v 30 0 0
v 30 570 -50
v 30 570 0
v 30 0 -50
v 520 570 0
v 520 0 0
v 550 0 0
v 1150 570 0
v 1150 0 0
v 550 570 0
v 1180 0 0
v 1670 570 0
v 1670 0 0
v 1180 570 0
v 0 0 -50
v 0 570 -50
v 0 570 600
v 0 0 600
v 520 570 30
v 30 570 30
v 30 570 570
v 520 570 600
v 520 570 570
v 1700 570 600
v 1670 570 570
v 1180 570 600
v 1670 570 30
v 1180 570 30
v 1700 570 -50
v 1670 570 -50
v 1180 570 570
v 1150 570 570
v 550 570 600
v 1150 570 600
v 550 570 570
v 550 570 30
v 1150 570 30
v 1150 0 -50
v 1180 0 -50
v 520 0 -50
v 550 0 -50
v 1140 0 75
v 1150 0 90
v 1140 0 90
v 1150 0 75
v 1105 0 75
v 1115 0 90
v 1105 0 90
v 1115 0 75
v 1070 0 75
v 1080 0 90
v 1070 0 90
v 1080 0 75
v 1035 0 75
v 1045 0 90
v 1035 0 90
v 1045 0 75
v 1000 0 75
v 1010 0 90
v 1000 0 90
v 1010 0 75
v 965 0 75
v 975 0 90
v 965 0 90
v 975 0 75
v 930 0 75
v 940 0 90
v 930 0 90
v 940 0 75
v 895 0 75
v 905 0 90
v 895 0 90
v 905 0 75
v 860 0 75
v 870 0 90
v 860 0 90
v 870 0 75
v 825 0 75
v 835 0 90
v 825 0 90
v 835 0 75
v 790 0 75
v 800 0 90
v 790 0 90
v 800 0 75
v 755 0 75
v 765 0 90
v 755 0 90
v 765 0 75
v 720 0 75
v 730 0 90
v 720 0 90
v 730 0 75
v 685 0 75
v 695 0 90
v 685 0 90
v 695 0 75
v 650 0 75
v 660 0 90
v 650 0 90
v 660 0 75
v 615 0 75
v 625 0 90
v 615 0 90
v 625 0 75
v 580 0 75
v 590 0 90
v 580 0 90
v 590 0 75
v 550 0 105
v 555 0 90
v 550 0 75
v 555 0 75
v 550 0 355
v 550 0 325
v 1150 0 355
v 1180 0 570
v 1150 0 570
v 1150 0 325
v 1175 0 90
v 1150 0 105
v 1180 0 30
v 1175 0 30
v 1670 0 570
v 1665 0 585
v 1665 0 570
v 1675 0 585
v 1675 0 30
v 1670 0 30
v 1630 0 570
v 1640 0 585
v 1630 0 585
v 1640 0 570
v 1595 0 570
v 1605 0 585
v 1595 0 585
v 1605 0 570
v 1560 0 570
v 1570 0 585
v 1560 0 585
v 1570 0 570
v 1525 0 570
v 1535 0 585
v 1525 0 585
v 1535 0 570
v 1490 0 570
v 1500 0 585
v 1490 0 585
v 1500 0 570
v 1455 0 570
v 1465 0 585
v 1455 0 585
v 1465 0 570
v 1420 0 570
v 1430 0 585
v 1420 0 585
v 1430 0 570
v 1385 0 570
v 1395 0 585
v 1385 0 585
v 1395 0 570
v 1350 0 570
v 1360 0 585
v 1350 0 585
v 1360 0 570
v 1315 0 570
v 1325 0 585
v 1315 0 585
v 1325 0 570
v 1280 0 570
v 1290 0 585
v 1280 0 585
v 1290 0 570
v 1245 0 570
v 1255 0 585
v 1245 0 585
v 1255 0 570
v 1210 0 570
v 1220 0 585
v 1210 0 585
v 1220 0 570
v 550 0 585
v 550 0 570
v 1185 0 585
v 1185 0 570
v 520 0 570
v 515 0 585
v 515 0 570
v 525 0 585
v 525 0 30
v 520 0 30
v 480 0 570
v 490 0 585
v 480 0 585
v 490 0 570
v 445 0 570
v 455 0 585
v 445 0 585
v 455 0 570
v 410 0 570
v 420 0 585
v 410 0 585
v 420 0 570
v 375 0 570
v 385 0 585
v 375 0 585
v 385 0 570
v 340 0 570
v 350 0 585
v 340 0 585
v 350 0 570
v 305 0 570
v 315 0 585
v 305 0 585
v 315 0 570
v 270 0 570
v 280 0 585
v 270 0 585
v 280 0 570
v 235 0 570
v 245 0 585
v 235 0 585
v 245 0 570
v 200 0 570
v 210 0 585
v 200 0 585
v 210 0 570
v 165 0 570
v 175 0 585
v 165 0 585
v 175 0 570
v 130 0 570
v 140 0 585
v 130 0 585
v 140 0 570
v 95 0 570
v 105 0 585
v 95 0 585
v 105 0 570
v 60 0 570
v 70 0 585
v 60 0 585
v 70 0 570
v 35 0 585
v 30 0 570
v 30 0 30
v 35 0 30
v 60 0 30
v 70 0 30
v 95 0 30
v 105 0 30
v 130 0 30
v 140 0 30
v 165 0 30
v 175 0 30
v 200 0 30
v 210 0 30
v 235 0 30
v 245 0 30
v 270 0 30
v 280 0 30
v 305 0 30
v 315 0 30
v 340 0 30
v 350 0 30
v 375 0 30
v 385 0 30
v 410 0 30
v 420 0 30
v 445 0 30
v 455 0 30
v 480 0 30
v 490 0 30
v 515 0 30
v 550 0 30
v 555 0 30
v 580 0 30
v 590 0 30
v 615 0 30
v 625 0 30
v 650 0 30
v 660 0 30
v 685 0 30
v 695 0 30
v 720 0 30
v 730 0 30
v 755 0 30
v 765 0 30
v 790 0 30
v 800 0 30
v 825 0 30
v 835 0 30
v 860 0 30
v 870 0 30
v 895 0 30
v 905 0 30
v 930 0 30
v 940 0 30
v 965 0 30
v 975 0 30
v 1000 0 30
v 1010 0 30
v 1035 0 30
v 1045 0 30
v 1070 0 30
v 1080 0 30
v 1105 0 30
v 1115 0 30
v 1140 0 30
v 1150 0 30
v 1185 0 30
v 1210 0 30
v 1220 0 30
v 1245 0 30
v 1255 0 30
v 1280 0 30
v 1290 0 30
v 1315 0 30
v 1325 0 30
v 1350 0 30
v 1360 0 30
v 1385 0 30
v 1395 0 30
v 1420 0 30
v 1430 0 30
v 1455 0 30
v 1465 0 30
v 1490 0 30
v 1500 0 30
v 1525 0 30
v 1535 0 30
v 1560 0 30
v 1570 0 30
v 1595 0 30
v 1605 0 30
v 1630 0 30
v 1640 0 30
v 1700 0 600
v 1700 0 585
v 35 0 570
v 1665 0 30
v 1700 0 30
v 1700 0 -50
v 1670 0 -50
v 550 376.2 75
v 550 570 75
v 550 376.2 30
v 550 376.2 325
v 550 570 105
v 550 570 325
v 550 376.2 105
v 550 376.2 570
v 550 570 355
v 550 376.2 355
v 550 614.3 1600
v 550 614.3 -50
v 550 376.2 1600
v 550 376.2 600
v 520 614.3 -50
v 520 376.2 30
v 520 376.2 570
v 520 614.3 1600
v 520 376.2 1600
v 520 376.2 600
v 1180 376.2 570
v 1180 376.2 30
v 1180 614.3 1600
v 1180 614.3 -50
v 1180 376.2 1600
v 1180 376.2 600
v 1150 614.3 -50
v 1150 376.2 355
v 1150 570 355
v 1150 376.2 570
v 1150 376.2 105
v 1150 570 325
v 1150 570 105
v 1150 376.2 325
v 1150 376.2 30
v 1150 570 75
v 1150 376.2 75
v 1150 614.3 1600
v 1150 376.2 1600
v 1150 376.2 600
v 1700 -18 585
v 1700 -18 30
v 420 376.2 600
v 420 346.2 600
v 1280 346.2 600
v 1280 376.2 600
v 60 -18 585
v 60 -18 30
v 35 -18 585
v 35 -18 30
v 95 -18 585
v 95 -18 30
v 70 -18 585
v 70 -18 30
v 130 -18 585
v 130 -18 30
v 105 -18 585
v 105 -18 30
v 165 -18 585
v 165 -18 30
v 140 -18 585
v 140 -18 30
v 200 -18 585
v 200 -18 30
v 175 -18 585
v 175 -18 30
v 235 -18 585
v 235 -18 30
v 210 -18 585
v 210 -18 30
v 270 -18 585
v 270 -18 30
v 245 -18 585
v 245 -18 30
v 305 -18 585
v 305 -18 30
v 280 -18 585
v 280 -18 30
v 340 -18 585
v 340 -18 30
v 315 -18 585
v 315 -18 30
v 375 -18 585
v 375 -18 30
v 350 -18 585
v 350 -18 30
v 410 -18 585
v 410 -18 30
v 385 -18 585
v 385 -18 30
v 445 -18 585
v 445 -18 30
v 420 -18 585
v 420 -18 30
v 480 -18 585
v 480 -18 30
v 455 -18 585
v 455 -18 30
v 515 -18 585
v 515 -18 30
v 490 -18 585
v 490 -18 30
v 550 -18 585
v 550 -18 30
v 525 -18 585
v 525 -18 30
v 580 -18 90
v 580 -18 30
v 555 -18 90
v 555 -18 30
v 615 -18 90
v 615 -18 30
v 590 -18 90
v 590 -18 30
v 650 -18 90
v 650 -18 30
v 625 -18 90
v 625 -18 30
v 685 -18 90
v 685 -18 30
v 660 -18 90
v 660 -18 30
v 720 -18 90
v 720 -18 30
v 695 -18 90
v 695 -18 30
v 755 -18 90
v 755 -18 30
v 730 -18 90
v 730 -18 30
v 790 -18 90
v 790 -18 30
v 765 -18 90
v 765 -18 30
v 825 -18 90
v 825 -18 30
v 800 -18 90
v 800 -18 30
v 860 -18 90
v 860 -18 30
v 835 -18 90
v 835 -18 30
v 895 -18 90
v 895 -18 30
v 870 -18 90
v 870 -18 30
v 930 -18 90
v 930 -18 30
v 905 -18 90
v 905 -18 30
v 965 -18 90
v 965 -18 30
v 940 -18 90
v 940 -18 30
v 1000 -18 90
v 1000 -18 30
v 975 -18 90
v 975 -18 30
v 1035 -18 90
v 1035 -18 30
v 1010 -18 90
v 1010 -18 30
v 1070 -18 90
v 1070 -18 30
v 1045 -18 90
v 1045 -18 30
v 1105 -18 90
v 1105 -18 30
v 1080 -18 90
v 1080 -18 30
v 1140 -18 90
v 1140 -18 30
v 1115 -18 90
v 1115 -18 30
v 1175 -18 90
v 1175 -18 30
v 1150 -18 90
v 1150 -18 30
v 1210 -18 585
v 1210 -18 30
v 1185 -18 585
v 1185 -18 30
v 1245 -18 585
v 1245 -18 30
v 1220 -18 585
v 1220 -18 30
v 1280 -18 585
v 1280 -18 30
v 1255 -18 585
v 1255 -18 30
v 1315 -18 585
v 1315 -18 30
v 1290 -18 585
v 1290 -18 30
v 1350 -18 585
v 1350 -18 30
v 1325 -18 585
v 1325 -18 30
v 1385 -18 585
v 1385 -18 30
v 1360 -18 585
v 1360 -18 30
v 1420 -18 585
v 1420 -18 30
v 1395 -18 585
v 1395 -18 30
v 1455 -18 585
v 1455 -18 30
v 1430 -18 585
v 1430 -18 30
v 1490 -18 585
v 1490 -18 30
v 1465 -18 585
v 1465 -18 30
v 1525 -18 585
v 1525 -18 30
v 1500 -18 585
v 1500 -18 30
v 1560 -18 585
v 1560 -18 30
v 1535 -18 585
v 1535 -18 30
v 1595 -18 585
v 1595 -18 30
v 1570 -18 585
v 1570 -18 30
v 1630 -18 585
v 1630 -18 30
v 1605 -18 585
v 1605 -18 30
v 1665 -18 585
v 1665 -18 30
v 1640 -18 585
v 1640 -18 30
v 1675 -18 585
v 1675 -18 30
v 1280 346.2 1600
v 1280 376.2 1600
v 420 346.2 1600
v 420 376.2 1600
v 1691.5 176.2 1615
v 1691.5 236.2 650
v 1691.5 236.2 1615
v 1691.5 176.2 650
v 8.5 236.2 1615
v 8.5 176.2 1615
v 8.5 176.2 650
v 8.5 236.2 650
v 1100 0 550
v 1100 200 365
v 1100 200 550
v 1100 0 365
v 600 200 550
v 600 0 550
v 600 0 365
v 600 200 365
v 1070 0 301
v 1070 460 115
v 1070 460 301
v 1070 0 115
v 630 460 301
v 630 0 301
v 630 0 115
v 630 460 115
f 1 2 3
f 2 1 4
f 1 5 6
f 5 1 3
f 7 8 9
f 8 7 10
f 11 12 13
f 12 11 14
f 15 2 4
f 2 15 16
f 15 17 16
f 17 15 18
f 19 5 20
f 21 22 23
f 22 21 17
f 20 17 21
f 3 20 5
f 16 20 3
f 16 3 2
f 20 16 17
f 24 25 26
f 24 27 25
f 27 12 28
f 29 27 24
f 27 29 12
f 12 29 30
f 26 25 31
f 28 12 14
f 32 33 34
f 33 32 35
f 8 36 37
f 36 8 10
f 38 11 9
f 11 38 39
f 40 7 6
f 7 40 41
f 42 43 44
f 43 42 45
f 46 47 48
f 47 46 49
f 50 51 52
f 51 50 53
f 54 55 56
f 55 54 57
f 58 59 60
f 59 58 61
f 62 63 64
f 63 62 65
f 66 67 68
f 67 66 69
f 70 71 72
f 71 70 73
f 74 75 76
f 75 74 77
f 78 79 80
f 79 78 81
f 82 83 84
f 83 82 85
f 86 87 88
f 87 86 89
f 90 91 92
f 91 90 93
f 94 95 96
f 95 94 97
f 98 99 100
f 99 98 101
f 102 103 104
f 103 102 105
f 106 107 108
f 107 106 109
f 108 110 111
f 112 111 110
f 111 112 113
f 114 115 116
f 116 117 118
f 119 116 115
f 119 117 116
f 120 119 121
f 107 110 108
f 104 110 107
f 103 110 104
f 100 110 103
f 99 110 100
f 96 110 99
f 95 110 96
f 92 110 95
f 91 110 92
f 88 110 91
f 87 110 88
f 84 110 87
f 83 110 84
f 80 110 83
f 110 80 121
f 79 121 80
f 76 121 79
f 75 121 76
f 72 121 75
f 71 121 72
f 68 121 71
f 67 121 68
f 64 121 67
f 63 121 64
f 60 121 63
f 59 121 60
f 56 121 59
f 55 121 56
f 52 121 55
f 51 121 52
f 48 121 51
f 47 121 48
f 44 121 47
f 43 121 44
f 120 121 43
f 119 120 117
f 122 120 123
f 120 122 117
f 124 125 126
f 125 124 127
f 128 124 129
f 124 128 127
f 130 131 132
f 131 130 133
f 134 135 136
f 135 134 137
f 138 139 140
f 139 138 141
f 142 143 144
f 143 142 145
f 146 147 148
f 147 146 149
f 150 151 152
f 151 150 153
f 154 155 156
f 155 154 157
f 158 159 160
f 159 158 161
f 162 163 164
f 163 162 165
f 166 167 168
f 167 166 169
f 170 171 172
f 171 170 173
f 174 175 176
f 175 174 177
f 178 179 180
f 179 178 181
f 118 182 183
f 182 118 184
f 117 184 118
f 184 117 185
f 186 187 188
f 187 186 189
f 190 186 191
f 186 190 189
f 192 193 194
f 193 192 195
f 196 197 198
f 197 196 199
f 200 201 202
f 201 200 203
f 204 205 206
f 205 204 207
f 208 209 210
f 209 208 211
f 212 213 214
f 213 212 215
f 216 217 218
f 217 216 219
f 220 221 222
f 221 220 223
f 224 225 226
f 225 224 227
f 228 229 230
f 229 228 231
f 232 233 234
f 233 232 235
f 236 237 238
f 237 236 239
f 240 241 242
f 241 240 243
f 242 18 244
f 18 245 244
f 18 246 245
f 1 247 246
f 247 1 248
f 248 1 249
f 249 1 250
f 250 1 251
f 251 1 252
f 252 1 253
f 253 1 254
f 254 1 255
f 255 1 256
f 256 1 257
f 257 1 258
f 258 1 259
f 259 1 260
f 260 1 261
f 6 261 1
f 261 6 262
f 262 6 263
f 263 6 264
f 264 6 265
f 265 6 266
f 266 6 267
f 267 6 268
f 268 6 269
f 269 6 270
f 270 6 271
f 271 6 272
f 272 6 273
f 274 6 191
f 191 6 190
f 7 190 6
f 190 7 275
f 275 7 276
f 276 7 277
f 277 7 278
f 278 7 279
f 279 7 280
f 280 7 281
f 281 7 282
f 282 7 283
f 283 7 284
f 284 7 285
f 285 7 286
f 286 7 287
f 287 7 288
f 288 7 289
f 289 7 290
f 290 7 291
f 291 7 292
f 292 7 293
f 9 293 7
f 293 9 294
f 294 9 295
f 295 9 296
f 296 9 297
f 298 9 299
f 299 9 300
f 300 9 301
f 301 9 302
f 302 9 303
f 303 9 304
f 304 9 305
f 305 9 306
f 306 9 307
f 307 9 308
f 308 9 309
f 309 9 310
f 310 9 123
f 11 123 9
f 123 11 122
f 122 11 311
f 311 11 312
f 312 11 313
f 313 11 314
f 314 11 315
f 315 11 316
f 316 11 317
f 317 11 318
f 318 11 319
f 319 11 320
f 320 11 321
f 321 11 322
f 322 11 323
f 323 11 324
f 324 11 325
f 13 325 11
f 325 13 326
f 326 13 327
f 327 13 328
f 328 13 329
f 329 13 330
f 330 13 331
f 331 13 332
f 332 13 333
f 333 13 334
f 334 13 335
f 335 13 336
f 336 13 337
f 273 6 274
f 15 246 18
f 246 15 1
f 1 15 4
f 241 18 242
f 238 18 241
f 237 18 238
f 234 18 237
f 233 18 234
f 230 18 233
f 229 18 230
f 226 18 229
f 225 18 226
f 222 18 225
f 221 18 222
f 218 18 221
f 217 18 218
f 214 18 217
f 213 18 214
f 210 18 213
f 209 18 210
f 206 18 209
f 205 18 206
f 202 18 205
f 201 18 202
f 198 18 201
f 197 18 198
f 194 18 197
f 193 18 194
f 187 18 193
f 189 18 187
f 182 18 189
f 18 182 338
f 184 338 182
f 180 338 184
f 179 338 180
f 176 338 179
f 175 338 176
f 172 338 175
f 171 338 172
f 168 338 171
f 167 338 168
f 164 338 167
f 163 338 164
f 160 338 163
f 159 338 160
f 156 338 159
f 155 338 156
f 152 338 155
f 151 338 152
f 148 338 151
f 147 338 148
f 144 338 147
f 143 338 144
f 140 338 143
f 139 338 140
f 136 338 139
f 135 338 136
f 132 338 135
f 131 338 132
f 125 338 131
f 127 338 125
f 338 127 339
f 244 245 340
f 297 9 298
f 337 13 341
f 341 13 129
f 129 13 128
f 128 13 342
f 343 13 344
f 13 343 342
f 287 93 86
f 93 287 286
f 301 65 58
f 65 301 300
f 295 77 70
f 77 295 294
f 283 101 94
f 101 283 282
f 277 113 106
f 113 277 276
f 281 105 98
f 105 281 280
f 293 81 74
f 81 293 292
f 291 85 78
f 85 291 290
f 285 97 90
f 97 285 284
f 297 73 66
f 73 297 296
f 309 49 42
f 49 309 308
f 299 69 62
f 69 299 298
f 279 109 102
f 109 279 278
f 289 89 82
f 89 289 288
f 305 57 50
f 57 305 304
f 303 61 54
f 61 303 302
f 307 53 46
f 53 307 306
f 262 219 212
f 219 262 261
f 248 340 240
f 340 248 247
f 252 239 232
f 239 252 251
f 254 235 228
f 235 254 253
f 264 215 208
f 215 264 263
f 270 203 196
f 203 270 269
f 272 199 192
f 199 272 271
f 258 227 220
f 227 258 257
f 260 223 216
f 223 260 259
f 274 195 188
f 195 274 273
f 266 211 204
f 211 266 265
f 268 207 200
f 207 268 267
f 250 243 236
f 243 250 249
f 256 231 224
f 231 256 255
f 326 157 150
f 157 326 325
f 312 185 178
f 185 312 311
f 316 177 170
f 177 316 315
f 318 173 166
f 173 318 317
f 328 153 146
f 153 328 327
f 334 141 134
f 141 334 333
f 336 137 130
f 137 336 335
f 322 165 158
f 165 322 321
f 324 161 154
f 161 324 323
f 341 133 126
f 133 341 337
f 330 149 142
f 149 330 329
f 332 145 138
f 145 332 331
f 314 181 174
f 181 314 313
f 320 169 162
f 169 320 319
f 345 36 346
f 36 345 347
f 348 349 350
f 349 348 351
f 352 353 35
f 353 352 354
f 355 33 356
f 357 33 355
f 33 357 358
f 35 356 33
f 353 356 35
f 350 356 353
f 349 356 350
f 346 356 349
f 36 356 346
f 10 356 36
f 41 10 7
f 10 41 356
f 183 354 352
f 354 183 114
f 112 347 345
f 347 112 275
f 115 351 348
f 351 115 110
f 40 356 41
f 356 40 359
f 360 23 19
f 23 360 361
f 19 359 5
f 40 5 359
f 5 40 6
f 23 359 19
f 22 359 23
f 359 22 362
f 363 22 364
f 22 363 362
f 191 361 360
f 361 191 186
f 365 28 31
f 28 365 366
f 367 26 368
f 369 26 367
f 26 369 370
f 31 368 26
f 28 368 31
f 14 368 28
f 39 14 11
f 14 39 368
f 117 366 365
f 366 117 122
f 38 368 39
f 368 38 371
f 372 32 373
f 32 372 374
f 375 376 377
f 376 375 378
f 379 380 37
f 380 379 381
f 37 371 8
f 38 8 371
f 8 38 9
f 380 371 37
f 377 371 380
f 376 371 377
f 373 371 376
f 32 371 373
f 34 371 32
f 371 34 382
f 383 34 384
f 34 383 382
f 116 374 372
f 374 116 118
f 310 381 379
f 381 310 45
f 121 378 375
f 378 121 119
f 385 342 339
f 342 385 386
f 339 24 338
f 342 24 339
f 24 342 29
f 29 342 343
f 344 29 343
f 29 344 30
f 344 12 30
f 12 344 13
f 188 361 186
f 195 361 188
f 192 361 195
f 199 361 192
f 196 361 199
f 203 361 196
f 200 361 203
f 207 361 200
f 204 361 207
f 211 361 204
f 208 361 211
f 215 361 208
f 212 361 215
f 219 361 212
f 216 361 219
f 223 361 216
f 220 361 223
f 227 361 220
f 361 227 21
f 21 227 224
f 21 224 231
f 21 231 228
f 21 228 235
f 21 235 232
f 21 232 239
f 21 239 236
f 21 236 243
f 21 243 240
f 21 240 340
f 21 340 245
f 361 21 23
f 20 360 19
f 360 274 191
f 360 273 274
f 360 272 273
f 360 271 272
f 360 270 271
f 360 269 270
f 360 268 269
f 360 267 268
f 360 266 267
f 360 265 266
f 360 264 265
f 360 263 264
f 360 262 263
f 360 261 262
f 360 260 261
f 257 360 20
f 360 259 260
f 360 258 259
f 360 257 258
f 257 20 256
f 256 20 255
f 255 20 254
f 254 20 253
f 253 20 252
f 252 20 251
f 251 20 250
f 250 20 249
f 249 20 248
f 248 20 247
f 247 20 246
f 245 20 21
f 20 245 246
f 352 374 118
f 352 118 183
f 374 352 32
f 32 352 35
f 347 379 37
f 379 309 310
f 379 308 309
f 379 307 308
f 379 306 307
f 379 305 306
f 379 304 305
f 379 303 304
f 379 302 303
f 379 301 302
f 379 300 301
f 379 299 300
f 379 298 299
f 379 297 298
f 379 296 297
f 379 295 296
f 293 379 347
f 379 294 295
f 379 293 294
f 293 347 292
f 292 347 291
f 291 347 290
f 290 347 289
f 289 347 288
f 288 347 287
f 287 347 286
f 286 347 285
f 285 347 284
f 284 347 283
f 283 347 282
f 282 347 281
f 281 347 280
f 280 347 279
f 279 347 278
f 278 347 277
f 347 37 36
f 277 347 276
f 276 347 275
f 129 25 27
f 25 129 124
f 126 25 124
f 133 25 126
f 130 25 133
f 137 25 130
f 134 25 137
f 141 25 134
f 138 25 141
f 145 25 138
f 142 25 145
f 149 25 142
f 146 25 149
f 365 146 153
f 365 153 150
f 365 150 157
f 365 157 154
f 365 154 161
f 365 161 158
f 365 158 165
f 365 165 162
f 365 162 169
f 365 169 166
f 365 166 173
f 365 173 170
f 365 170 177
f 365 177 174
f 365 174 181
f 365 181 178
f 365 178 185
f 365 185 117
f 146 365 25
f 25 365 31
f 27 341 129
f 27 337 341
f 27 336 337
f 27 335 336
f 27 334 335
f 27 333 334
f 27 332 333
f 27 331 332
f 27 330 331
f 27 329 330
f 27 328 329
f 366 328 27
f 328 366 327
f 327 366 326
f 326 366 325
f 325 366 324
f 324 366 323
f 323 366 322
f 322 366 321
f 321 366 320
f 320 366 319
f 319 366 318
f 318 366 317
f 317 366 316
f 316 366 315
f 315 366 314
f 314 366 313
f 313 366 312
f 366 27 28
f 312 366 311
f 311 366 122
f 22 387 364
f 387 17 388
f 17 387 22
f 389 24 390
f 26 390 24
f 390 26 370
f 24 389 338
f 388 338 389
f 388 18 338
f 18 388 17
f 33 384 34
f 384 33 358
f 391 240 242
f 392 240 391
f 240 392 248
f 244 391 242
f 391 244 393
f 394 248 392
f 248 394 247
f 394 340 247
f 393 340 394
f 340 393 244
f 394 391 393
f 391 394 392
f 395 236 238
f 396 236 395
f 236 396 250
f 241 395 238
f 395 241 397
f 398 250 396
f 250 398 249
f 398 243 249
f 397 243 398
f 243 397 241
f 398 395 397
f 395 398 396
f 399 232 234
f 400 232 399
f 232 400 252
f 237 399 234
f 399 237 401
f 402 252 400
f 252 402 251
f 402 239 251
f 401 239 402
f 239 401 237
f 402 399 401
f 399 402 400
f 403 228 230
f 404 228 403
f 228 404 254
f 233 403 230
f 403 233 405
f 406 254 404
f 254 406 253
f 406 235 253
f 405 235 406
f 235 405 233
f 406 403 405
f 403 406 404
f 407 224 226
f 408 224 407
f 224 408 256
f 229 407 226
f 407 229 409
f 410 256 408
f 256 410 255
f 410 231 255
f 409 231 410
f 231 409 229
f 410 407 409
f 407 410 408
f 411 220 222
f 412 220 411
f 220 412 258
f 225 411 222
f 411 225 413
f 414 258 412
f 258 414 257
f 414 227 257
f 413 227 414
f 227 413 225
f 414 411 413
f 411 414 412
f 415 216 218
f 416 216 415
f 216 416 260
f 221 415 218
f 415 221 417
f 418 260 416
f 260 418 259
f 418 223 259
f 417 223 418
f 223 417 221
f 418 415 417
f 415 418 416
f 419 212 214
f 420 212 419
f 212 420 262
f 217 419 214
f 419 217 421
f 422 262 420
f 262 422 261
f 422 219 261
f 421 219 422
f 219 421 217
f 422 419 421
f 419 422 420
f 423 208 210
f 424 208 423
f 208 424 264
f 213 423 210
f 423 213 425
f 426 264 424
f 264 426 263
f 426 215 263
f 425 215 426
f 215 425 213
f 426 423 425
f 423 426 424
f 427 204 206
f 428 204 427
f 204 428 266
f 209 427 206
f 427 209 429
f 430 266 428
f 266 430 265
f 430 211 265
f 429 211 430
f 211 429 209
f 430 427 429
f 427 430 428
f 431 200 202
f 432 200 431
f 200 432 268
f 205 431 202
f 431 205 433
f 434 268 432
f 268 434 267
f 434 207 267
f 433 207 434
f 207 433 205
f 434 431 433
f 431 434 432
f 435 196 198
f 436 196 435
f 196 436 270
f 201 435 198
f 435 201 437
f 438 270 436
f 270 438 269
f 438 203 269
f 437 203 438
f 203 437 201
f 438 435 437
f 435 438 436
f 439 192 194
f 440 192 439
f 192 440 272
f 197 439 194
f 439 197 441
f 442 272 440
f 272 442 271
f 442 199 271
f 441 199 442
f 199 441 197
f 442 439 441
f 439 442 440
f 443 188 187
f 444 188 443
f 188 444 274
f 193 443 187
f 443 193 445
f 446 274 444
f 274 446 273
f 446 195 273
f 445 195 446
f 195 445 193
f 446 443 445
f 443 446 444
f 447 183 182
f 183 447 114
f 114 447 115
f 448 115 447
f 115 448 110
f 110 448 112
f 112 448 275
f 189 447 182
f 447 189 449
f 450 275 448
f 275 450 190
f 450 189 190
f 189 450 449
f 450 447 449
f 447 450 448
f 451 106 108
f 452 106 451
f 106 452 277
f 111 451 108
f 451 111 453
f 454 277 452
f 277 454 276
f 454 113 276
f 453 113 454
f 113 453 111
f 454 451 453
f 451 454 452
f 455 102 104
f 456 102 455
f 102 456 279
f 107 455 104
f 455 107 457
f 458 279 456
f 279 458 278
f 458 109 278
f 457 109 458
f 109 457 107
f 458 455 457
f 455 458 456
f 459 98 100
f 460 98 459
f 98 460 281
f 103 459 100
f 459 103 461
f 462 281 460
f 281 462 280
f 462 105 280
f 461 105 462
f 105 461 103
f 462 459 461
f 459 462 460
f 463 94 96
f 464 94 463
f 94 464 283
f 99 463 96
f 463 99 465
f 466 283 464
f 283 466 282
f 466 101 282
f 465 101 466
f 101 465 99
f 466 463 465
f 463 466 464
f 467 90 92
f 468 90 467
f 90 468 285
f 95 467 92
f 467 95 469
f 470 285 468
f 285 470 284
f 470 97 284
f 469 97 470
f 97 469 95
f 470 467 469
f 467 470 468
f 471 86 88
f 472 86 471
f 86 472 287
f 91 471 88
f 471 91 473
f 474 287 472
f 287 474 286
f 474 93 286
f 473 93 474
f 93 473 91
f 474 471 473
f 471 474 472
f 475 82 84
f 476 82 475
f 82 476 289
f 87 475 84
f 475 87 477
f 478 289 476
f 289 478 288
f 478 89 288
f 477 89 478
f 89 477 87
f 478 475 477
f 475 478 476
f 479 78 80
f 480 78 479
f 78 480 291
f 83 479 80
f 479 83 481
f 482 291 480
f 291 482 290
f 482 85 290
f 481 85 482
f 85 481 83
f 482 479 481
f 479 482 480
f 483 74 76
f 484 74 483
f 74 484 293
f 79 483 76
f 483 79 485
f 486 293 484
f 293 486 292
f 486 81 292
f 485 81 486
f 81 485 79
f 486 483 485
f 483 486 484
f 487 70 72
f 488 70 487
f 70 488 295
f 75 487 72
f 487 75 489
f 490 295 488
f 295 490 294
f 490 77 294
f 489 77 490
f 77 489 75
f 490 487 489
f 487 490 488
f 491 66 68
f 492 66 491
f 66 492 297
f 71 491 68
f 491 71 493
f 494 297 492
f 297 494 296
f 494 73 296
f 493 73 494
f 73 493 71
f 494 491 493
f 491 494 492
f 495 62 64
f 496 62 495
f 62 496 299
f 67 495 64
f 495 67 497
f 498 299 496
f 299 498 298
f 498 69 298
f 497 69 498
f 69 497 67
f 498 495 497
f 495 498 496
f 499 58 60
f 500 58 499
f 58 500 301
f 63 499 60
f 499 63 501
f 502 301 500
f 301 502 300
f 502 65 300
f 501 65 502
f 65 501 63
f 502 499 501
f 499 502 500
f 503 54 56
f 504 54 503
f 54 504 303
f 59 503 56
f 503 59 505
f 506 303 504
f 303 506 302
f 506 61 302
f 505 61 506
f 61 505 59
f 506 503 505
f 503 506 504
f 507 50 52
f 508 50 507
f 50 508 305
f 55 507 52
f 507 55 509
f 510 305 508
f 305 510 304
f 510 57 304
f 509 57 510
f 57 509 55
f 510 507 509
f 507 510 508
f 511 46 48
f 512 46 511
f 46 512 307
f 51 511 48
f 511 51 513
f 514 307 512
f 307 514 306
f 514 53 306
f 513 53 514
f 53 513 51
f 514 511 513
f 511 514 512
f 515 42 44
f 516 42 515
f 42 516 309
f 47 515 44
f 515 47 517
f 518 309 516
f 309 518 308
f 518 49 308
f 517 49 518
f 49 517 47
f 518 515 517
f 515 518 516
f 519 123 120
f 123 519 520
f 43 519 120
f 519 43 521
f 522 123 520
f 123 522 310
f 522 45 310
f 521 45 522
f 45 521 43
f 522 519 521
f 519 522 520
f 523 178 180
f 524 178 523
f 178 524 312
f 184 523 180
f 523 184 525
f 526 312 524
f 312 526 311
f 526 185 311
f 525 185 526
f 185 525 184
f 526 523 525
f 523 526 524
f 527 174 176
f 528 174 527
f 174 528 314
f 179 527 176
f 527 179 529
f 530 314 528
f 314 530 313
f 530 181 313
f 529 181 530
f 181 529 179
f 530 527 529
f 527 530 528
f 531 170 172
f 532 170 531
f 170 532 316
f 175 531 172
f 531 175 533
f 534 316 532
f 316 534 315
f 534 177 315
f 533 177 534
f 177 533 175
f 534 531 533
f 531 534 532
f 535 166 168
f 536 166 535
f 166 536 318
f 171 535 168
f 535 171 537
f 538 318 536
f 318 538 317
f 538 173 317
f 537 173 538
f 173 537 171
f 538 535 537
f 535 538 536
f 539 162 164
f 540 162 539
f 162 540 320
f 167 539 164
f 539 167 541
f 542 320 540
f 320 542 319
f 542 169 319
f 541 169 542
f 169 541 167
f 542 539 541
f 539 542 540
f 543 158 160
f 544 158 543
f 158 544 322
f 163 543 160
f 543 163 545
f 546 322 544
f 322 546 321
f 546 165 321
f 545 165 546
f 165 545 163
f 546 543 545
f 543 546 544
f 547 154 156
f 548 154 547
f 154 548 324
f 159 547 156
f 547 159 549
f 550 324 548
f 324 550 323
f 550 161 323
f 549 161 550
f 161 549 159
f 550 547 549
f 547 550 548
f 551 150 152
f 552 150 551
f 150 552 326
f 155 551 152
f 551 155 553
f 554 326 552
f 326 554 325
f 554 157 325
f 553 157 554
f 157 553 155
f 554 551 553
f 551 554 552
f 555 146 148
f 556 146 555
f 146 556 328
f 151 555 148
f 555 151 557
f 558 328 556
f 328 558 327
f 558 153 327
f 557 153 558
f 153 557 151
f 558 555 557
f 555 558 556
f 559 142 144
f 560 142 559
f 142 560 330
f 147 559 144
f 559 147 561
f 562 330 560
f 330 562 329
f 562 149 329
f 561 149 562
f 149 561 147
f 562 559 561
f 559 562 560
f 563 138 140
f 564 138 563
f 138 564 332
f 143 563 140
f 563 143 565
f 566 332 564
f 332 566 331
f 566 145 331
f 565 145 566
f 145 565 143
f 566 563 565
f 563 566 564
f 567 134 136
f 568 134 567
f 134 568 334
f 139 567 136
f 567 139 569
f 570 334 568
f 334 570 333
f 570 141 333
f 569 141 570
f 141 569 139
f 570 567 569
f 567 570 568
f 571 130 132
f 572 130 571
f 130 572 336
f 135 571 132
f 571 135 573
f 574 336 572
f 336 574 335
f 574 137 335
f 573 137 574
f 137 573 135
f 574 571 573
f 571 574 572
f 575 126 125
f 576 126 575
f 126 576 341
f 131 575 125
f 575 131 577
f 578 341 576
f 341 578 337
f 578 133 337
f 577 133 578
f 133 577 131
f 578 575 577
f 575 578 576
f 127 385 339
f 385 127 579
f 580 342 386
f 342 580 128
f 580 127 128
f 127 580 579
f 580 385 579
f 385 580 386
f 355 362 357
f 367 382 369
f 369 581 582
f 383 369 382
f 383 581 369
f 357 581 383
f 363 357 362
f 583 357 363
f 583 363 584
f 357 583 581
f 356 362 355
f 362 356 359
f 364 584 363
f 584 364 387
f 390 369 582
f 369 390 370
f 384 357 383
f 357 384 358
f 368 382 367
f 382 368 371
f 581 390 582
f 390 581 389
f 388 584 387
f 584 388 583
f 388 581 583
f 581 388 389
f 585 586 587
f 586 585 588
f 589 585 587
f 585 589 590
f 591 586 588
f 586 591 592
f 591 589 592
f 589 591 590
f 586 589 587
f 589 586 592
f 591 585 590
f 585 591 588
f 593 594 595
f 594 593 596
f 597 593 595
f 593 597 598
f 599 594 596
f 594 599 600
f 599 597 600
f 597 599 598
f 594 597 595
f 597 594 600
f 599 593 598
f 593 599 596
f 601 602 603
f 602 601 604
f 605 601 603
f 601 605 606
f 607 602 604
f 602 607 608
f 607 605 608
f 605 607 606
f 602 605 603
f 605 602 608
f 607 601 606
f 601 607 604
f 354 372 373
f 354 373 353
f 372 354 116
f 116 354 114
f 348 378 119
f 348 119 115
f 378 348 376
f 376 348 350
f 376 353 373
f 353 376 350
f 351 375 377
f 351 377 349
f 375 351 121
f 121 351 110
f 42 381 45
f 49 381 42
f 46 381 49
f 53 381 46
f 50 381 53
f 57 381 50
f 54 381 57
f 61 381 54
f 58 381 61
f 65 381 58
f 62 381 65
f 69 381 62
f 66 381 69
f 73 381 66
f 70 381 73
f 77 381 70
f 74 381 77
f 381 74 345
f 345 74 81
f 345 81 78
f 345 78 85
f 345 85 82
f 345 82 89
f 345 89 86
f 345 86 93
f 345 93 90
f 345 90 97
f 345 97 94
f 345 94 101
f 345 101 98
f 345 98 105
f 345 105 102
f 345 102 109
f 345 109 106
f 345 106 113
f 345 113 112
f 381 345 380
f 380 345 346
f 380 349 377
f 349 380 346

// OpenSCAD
top_u = 0;
bottom_u = 12;

middle_width = 600;
u_width = 490;
u = 45;

depth = 570;

top_cabinet_h = top_u * u;
bottom_cabinet_h = bottom_u * u;
single_wall = 15;

shelf_h = bottom_cabinet_h-2*single_wall-200;
shelf_h2 = 60;

leg_h = 50;



top_h = 2 * single_wall;
bottom_h = 2*single_wall;

panel_d = 18;
panel_h = 25;
panel_dist = 10;

// height without legs
main_h = bottom_h + bottom_cabinet_h + 0*single_wall + top_cabinet_h + top_h;
main_w = 6*single_wall + middle_width + 2*u_width + 2*single_wall;
total_h = main_h + leg_h;

tv_mount_offset = 110;
module rack(num, width=u_width){
    cube([width, depth, num*u]);
}

module leg() {
    cube([2*single_wall, depth, leg_h]);
}
module legs4() {
    translate([0, 0, -leg_h]) {
      translate([0,0,0]) leg();
      translate([2*single_wall+u_width,0,0]) leg();
      translate([4*single_wall+u_width+middle_width,0,0]) leg();
      translate([6*single_wall+2*u_width+middle_width,0,0]) leg();
     }
}
module main() {
    legs4();
    difference() {
    cube([main_w, depth, main_h]);
    translate([0, 0, bottom_h]) {
        translate([2*single_wall, 0, 0]) rack(bottom_u);
        translate([4*single_wall+u_width, 0, 0]) rack(bottom_u, middle_width);
        translate([6*single_wall+u_width+middle_width, 0, 0]) rack(bottom_u);
    }
    translate([0, 0, bottom_h+single_wall+bottom_cabinet_h]) {
        translate([2*single_wall, 0, 0]) rack(top_u);
        translate([4*single_wall+u_width, 0, 0]) rack(top_u, middle_width);
        translate([6*single_wall+u_width+middle_width, 0, 0]) rack(top_u);
    }
    }
}

module shelf(h) {
    translate([4*single_wall+u_width, 0, single_wall+h])
    cube([middle_width, depth, 2*single_wall]);
}

 
 module front_panel_v(h, w) {
    num = w / (panel_h+panel_dist);
    //echo("num", num);
    for (i = [0:1:num]) {
        //echo("i", i);
        translate([i*(panel_dist+panel_h), 0, 0]) 
          translate([0.5*panel_dist, 0, 0]) cube([panel_h, panel_d, h]);
    }
 }

 
 module panel_set3() {
     translate([2*single_wall, -panel_d, bottom_h]) 
       front_panel_v(bottom_cabinet_h + top_cabinet_h + single_wall, u_width);    
     translate([4*single_wall+u_width, -panel_d, bottom_h]) 
       front_panel_v(shelf_h2, middle_width);
     translate([6*single_wall+u_width+middle_width, -panel_d, bottom_h]) 
       front_panel_v(bottom_cabinet_h + top_cabinet_h + single_wall, u_width);
 }
 
 module tv_stand(h, w) {
     stand_depth = 50+0.33*depth;
     stand_h = total_h + h;
     tv_plate_h = 0.25 * h;
     translate([u_width+2*single_wall, 0.66*depth, -leg_h]) {
         cube([2*single_wall, stand_depth, stand_h]);
         translate([middle_width+2*single_wall, 0, 0]) 
           cube([2*single_wall, stand_depth, stand_h]);
           translate([-100, -2*single_wall, total_h])
             cube([middle_width+4*single_wall+200, 2*single_wall, h]);
     }

 }
 
 module tv() {
     h = 965;
     w = 1683;
     d = 60;
     
     cube([w, d, h]);
     }
     
 module speaker() {
    color([0,0,1]) translate([-250, 0, 0]) cube([500, 200, 185]);
} 

module receiver() {
    color("black") translate([-220, 0, 0]) cube([440, 460, 186]);
}

module appliances() { 
     translate([0.5*(main_w-1683), 0.66*depth - 2*single_wall - 60 - tv_mount_offset, main_h+50]) tv();
     translate([0.5*main_w, 0, 3*single_wall+shelf_h+10]) speaker();
     translate([0.5*main_w, 0, 3*single_wall+shelf_h2+10]) receiver();
}
main();
panel_set3();
tv_stand(1000, 100);
shelf(shelf_h);
shelf(shelf_h2);
appliances();
mid = shelf_h - 220 - single_wall;
echo ("mid", mid);
echo("Height: ", total_h);
echo("Width: ", main_w);
